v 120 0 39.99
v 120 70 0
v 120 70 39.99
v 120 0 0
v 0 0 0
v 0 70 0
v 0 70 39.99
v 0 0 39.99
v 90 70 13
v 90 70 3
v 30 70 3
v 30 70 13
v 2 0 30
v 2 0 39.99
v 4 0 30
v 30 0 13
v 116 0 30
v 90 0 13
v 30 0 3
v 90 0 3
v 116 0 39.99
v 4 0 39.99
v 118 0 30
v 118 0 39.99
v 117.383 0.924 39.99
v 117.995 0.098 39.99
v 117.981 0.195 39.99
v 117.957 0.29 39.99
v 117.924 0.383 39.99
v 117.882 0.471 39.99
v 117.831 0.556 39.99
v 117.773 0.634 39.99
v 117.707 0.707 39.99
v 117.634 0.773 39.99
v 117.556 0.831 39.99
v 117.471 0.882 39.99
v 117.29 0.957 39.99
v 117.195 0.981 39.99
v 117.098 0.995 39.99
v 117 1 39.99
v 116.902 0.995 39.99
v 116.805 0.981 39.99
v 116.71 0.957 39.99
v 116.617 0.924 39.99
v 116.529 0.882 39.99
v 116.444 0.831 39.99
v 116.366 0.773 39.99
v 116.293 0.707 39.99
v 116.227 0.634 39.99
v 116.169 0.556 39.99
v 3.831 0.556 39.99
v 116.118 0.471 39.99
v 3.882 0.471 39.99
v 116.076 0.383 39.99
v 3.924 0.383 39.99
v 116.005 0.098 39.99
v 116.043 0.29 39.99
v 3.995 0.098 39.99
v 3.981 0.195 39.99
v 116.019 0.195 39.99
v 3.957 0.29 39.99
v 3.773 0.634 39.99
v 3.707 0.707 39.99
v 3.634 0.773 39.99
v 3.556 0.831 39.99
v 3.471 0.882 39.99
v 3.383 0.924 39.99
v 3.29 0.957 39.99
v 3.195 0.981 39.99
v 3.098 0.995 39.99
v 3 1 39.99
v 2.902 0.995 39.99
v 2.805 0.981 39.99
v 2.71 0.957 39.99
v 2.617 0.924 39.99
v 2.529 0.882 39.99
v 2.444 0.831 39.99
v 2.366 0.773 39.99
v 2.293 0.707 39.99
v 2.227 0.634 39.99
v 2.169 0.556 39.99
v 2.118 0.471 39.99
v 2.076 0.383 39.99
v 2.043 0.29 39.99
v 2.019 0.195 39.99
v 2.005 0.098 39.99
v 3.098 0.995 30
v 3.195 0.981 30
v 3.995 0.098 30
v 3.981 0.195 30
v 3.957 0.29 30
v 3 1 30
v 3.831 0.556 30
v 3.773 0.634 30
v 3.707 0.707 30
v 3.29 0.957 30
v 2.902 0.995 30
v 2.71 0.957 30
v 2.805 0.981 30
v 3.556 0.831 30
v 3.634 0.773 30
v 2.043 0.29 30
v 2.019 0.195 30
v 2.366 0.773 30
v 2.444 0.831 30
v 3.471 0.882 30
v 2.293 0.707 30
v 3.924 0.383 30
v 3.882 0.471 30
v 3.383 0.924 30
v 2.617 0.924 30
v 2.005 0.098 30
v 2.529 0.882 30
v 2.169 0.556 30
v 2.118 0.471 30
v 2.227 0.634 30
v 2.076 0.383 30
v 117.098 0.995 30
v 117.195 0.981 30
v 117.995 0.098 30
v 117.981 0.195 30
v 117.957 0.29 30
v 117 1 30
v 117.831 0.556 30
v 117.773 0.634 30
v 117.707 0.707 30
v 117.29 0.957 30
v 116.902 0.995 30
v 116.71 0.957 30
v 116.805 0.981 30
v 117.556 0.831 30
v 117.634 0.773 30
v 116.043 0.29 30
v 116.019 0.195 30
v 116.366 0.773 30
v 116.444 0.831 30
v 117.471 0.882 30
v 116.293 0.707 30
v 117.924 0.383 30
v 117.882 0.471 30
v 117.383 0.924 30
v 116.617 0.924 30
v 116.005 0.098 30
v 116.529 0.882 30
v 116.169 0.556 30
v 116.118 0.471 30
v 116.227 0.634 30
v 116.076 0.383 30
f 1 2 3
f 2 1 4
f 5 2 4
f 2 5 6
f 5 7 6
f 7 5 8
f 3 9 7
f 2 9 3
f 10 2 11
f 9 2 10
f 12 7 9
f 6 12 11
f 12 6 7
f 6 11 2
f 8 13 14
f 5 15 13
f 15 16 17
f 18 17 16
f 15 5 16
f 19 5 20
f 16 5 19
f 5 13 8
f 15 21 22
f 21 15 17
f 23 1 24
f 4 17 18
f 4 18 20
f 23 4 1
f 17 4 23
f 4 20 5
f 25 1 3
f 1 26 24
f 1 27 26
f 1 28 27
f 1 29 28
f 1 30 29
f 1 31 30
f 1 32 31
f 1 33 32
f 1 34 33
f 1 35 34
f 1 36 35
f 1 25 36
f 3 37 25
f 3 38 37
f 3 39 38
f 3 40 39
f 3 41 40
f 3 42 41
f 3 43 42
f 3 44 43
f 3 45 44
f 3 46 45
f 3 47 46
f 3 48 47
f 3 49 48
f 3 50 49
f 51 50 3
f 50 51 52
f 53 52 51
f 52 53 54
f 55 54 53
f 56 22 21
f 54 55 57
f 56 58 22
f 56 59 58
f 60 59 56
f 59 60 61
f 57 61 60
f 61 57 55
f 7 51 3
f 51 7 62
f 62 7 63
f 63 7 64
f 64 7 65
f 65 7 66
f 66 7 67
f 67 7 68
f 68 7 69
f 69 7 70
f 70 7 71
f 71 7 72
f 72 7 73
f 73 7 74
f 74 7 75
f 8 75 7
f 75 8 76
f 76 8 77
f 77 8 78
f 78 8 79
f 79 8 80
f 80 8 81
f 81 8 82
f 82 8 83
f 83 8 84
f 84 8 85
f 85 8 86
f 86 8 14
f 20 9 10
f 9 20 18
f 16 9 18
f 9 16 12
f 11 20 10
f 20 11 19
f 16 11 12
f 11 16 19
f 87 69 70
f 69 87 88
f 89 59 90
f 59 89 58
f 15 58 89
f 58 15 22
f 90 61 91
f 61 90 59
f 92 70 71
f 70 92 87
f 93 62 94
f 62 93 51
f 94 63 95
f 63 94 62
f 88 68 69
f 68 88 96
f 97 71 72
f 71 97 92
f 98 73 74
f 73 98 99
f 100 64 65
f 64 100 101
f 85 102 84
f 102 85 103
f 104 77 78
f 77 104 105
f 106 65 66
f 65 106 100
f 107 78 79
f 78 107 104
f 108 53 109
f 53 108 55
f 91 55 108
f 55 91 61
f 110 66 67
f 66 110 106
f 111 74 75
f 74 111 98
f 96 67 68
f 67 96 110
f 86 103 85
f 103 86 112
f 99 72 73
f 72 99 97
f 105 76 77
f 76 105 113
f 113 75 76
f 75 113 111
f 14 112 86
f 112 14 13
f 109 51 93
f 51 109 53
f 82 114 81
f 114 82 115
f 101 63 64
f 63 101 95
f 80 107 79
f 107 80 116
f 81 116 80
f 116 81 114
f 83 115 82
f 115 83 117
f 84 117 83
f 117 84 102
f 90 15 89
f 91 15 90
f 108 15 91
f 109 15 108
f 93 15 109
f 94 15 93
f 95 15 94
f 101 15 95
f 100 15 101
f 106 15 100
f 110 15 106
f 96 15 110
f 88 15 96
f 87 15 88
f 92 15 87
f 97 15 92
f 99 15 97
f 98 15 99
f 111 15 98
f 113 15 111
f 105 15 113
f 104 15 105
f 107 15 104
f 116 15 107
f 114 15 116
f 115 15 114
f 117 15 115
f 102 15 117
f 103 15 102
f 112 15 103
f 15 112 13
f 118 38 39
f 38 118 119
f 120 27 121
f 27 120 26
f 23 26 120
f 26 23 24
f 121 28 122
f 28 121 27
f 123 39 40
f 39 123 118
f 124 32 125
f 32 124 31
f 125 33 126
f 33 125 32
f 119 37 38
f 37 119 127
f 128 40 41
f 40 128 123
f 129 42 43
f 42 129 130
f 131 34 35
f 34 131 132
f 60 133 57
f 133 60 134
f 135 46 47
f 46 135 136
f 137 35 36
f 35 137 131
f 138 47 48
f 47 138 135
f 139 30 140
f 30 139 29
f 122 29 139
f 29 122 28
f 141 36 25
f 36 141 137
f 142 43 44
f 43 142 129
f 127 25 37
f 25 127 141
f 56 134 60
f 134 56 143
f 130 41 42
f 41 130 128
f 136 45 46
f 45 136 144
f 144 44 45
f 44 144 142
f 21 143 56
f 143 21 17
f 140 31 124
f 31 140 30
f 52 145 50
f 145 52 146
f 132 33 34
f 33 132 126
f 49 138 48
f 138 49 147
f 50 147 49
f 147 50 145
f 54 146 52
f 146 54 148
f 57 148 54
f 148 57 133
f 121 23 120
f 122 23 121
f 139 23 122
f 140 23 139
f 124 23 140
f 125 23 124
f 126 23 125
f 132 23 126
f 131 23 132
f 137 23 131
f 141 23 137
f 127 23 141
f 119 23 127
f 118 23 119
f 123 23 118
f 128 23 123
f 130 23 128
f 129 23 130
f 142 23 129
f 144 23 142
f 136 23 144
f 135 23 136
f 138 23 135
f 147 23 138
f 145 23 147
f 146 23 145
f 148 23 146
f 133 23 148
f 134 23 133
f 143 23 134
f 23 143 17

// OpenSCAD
// Buffer Tank for Mini Horizontal Gel Electrophoresis
// Units: millimetres

// Outer Dimensions
$outer_width_x = 120; // X
$outer_width_y = 70;  // Y
$outer_height_z = 40; // Z

// Wall and Floor Thickness
$wall_thickness = 3;
$floor_thickness = 3;

// Platform Dimensions
$platform_length_x = 60; // Length in X (centred)
$platform_width_y = $outer_width_y; // Spans full inner width (Y)
$platform_height_rel_inner = 10; // Height above inner floor
$platform_top_z = $floor_thickness + $platform_height_rel_inner; // Absolute Z of top surface

// Electrode Hole Dimensions
$hole_diameter = 2;
$hole_y_pos = 0;
$hole_z_pos = 30;

// Quality Settings
$fn = 64;

// Calculate Inner Dimensions
$inner_width_x = $outer_width_x - 2 * $wall_thickness;
$inner_width_y = $outer_width_y - 2 * $wall_thickness;
$inner_height_z = $outer_height_z - $floor_thickness - $wall_thickness;

// Calculate Platform Top Z
// Inner floor is at Z = $floor_thickness
// Platform top is at Z = $floor_thickness + $platform_height_rel_inner
$platform_top_z = $floor_thickness + $platform_height_rel_inner;

// Start modeling
difference() {
    // 1. Main Tank Body (Open Top)
    // Outer box minus top face
    cube([
        $outer_width_x, 
        $outer_width_y, 
        $outer_height_z
    ], center = false);
    
    // Cut open top (extend slightly past top face)
    translate([0, 0, $outer_height_z - 0.01]) {
        cube([
            $outer_width_x, 
            $outer_width_y, 
            0.02
        ]);
    }

    // 2. Internal Platform
    // Position: Centred in X, Full Width in Y, Sitting on inner floor
    translate([
        ($outer_width_x / 2) - ($platform_length_x / 2), 
        ($outer_width_y / 2) - ($platform_width_y / 2), 
        $floor_thickness
    ]) {
        // Platform is a solid block
        cube([
            $platform_length_x, 
            $platform_width_y, 
            $platform_height_rel_inner
        ]);
    }

    // 3. Electrode Holes
    // Two holes: Left and Right ends of the tank
    // Hole center X: Wall thickness +/- (OuterWidth/2 - PlatformLength/2 - HoleRadius)
    // Actually, simpler: The hole is in the end wall. 
    // Left Wall X center: $wall_thickness
    // Right Wall X center: $outer_width_x - $wall_thickness
    
    $hole_radius = $hole_diameter / 2;
    
    // Left Hole
    translate([
        $wall_thickness, 
        $hole_y_pos, 
        $hole_z_pos
    ]) {
        cylinder(
            h = $outer_height_z, 
            r = $hole_radius, 
            center = false
        );
    }
    
    // Right Hole
    translate([
        $outer_width_x - $wall_thickness, 
        $hole_y_pos, 
        $hole_z_pos
    ]) {
        cylinder(
            h = $outer_height_z, 
            r = $hole_radius, 
            center = false
        );
    }
}
